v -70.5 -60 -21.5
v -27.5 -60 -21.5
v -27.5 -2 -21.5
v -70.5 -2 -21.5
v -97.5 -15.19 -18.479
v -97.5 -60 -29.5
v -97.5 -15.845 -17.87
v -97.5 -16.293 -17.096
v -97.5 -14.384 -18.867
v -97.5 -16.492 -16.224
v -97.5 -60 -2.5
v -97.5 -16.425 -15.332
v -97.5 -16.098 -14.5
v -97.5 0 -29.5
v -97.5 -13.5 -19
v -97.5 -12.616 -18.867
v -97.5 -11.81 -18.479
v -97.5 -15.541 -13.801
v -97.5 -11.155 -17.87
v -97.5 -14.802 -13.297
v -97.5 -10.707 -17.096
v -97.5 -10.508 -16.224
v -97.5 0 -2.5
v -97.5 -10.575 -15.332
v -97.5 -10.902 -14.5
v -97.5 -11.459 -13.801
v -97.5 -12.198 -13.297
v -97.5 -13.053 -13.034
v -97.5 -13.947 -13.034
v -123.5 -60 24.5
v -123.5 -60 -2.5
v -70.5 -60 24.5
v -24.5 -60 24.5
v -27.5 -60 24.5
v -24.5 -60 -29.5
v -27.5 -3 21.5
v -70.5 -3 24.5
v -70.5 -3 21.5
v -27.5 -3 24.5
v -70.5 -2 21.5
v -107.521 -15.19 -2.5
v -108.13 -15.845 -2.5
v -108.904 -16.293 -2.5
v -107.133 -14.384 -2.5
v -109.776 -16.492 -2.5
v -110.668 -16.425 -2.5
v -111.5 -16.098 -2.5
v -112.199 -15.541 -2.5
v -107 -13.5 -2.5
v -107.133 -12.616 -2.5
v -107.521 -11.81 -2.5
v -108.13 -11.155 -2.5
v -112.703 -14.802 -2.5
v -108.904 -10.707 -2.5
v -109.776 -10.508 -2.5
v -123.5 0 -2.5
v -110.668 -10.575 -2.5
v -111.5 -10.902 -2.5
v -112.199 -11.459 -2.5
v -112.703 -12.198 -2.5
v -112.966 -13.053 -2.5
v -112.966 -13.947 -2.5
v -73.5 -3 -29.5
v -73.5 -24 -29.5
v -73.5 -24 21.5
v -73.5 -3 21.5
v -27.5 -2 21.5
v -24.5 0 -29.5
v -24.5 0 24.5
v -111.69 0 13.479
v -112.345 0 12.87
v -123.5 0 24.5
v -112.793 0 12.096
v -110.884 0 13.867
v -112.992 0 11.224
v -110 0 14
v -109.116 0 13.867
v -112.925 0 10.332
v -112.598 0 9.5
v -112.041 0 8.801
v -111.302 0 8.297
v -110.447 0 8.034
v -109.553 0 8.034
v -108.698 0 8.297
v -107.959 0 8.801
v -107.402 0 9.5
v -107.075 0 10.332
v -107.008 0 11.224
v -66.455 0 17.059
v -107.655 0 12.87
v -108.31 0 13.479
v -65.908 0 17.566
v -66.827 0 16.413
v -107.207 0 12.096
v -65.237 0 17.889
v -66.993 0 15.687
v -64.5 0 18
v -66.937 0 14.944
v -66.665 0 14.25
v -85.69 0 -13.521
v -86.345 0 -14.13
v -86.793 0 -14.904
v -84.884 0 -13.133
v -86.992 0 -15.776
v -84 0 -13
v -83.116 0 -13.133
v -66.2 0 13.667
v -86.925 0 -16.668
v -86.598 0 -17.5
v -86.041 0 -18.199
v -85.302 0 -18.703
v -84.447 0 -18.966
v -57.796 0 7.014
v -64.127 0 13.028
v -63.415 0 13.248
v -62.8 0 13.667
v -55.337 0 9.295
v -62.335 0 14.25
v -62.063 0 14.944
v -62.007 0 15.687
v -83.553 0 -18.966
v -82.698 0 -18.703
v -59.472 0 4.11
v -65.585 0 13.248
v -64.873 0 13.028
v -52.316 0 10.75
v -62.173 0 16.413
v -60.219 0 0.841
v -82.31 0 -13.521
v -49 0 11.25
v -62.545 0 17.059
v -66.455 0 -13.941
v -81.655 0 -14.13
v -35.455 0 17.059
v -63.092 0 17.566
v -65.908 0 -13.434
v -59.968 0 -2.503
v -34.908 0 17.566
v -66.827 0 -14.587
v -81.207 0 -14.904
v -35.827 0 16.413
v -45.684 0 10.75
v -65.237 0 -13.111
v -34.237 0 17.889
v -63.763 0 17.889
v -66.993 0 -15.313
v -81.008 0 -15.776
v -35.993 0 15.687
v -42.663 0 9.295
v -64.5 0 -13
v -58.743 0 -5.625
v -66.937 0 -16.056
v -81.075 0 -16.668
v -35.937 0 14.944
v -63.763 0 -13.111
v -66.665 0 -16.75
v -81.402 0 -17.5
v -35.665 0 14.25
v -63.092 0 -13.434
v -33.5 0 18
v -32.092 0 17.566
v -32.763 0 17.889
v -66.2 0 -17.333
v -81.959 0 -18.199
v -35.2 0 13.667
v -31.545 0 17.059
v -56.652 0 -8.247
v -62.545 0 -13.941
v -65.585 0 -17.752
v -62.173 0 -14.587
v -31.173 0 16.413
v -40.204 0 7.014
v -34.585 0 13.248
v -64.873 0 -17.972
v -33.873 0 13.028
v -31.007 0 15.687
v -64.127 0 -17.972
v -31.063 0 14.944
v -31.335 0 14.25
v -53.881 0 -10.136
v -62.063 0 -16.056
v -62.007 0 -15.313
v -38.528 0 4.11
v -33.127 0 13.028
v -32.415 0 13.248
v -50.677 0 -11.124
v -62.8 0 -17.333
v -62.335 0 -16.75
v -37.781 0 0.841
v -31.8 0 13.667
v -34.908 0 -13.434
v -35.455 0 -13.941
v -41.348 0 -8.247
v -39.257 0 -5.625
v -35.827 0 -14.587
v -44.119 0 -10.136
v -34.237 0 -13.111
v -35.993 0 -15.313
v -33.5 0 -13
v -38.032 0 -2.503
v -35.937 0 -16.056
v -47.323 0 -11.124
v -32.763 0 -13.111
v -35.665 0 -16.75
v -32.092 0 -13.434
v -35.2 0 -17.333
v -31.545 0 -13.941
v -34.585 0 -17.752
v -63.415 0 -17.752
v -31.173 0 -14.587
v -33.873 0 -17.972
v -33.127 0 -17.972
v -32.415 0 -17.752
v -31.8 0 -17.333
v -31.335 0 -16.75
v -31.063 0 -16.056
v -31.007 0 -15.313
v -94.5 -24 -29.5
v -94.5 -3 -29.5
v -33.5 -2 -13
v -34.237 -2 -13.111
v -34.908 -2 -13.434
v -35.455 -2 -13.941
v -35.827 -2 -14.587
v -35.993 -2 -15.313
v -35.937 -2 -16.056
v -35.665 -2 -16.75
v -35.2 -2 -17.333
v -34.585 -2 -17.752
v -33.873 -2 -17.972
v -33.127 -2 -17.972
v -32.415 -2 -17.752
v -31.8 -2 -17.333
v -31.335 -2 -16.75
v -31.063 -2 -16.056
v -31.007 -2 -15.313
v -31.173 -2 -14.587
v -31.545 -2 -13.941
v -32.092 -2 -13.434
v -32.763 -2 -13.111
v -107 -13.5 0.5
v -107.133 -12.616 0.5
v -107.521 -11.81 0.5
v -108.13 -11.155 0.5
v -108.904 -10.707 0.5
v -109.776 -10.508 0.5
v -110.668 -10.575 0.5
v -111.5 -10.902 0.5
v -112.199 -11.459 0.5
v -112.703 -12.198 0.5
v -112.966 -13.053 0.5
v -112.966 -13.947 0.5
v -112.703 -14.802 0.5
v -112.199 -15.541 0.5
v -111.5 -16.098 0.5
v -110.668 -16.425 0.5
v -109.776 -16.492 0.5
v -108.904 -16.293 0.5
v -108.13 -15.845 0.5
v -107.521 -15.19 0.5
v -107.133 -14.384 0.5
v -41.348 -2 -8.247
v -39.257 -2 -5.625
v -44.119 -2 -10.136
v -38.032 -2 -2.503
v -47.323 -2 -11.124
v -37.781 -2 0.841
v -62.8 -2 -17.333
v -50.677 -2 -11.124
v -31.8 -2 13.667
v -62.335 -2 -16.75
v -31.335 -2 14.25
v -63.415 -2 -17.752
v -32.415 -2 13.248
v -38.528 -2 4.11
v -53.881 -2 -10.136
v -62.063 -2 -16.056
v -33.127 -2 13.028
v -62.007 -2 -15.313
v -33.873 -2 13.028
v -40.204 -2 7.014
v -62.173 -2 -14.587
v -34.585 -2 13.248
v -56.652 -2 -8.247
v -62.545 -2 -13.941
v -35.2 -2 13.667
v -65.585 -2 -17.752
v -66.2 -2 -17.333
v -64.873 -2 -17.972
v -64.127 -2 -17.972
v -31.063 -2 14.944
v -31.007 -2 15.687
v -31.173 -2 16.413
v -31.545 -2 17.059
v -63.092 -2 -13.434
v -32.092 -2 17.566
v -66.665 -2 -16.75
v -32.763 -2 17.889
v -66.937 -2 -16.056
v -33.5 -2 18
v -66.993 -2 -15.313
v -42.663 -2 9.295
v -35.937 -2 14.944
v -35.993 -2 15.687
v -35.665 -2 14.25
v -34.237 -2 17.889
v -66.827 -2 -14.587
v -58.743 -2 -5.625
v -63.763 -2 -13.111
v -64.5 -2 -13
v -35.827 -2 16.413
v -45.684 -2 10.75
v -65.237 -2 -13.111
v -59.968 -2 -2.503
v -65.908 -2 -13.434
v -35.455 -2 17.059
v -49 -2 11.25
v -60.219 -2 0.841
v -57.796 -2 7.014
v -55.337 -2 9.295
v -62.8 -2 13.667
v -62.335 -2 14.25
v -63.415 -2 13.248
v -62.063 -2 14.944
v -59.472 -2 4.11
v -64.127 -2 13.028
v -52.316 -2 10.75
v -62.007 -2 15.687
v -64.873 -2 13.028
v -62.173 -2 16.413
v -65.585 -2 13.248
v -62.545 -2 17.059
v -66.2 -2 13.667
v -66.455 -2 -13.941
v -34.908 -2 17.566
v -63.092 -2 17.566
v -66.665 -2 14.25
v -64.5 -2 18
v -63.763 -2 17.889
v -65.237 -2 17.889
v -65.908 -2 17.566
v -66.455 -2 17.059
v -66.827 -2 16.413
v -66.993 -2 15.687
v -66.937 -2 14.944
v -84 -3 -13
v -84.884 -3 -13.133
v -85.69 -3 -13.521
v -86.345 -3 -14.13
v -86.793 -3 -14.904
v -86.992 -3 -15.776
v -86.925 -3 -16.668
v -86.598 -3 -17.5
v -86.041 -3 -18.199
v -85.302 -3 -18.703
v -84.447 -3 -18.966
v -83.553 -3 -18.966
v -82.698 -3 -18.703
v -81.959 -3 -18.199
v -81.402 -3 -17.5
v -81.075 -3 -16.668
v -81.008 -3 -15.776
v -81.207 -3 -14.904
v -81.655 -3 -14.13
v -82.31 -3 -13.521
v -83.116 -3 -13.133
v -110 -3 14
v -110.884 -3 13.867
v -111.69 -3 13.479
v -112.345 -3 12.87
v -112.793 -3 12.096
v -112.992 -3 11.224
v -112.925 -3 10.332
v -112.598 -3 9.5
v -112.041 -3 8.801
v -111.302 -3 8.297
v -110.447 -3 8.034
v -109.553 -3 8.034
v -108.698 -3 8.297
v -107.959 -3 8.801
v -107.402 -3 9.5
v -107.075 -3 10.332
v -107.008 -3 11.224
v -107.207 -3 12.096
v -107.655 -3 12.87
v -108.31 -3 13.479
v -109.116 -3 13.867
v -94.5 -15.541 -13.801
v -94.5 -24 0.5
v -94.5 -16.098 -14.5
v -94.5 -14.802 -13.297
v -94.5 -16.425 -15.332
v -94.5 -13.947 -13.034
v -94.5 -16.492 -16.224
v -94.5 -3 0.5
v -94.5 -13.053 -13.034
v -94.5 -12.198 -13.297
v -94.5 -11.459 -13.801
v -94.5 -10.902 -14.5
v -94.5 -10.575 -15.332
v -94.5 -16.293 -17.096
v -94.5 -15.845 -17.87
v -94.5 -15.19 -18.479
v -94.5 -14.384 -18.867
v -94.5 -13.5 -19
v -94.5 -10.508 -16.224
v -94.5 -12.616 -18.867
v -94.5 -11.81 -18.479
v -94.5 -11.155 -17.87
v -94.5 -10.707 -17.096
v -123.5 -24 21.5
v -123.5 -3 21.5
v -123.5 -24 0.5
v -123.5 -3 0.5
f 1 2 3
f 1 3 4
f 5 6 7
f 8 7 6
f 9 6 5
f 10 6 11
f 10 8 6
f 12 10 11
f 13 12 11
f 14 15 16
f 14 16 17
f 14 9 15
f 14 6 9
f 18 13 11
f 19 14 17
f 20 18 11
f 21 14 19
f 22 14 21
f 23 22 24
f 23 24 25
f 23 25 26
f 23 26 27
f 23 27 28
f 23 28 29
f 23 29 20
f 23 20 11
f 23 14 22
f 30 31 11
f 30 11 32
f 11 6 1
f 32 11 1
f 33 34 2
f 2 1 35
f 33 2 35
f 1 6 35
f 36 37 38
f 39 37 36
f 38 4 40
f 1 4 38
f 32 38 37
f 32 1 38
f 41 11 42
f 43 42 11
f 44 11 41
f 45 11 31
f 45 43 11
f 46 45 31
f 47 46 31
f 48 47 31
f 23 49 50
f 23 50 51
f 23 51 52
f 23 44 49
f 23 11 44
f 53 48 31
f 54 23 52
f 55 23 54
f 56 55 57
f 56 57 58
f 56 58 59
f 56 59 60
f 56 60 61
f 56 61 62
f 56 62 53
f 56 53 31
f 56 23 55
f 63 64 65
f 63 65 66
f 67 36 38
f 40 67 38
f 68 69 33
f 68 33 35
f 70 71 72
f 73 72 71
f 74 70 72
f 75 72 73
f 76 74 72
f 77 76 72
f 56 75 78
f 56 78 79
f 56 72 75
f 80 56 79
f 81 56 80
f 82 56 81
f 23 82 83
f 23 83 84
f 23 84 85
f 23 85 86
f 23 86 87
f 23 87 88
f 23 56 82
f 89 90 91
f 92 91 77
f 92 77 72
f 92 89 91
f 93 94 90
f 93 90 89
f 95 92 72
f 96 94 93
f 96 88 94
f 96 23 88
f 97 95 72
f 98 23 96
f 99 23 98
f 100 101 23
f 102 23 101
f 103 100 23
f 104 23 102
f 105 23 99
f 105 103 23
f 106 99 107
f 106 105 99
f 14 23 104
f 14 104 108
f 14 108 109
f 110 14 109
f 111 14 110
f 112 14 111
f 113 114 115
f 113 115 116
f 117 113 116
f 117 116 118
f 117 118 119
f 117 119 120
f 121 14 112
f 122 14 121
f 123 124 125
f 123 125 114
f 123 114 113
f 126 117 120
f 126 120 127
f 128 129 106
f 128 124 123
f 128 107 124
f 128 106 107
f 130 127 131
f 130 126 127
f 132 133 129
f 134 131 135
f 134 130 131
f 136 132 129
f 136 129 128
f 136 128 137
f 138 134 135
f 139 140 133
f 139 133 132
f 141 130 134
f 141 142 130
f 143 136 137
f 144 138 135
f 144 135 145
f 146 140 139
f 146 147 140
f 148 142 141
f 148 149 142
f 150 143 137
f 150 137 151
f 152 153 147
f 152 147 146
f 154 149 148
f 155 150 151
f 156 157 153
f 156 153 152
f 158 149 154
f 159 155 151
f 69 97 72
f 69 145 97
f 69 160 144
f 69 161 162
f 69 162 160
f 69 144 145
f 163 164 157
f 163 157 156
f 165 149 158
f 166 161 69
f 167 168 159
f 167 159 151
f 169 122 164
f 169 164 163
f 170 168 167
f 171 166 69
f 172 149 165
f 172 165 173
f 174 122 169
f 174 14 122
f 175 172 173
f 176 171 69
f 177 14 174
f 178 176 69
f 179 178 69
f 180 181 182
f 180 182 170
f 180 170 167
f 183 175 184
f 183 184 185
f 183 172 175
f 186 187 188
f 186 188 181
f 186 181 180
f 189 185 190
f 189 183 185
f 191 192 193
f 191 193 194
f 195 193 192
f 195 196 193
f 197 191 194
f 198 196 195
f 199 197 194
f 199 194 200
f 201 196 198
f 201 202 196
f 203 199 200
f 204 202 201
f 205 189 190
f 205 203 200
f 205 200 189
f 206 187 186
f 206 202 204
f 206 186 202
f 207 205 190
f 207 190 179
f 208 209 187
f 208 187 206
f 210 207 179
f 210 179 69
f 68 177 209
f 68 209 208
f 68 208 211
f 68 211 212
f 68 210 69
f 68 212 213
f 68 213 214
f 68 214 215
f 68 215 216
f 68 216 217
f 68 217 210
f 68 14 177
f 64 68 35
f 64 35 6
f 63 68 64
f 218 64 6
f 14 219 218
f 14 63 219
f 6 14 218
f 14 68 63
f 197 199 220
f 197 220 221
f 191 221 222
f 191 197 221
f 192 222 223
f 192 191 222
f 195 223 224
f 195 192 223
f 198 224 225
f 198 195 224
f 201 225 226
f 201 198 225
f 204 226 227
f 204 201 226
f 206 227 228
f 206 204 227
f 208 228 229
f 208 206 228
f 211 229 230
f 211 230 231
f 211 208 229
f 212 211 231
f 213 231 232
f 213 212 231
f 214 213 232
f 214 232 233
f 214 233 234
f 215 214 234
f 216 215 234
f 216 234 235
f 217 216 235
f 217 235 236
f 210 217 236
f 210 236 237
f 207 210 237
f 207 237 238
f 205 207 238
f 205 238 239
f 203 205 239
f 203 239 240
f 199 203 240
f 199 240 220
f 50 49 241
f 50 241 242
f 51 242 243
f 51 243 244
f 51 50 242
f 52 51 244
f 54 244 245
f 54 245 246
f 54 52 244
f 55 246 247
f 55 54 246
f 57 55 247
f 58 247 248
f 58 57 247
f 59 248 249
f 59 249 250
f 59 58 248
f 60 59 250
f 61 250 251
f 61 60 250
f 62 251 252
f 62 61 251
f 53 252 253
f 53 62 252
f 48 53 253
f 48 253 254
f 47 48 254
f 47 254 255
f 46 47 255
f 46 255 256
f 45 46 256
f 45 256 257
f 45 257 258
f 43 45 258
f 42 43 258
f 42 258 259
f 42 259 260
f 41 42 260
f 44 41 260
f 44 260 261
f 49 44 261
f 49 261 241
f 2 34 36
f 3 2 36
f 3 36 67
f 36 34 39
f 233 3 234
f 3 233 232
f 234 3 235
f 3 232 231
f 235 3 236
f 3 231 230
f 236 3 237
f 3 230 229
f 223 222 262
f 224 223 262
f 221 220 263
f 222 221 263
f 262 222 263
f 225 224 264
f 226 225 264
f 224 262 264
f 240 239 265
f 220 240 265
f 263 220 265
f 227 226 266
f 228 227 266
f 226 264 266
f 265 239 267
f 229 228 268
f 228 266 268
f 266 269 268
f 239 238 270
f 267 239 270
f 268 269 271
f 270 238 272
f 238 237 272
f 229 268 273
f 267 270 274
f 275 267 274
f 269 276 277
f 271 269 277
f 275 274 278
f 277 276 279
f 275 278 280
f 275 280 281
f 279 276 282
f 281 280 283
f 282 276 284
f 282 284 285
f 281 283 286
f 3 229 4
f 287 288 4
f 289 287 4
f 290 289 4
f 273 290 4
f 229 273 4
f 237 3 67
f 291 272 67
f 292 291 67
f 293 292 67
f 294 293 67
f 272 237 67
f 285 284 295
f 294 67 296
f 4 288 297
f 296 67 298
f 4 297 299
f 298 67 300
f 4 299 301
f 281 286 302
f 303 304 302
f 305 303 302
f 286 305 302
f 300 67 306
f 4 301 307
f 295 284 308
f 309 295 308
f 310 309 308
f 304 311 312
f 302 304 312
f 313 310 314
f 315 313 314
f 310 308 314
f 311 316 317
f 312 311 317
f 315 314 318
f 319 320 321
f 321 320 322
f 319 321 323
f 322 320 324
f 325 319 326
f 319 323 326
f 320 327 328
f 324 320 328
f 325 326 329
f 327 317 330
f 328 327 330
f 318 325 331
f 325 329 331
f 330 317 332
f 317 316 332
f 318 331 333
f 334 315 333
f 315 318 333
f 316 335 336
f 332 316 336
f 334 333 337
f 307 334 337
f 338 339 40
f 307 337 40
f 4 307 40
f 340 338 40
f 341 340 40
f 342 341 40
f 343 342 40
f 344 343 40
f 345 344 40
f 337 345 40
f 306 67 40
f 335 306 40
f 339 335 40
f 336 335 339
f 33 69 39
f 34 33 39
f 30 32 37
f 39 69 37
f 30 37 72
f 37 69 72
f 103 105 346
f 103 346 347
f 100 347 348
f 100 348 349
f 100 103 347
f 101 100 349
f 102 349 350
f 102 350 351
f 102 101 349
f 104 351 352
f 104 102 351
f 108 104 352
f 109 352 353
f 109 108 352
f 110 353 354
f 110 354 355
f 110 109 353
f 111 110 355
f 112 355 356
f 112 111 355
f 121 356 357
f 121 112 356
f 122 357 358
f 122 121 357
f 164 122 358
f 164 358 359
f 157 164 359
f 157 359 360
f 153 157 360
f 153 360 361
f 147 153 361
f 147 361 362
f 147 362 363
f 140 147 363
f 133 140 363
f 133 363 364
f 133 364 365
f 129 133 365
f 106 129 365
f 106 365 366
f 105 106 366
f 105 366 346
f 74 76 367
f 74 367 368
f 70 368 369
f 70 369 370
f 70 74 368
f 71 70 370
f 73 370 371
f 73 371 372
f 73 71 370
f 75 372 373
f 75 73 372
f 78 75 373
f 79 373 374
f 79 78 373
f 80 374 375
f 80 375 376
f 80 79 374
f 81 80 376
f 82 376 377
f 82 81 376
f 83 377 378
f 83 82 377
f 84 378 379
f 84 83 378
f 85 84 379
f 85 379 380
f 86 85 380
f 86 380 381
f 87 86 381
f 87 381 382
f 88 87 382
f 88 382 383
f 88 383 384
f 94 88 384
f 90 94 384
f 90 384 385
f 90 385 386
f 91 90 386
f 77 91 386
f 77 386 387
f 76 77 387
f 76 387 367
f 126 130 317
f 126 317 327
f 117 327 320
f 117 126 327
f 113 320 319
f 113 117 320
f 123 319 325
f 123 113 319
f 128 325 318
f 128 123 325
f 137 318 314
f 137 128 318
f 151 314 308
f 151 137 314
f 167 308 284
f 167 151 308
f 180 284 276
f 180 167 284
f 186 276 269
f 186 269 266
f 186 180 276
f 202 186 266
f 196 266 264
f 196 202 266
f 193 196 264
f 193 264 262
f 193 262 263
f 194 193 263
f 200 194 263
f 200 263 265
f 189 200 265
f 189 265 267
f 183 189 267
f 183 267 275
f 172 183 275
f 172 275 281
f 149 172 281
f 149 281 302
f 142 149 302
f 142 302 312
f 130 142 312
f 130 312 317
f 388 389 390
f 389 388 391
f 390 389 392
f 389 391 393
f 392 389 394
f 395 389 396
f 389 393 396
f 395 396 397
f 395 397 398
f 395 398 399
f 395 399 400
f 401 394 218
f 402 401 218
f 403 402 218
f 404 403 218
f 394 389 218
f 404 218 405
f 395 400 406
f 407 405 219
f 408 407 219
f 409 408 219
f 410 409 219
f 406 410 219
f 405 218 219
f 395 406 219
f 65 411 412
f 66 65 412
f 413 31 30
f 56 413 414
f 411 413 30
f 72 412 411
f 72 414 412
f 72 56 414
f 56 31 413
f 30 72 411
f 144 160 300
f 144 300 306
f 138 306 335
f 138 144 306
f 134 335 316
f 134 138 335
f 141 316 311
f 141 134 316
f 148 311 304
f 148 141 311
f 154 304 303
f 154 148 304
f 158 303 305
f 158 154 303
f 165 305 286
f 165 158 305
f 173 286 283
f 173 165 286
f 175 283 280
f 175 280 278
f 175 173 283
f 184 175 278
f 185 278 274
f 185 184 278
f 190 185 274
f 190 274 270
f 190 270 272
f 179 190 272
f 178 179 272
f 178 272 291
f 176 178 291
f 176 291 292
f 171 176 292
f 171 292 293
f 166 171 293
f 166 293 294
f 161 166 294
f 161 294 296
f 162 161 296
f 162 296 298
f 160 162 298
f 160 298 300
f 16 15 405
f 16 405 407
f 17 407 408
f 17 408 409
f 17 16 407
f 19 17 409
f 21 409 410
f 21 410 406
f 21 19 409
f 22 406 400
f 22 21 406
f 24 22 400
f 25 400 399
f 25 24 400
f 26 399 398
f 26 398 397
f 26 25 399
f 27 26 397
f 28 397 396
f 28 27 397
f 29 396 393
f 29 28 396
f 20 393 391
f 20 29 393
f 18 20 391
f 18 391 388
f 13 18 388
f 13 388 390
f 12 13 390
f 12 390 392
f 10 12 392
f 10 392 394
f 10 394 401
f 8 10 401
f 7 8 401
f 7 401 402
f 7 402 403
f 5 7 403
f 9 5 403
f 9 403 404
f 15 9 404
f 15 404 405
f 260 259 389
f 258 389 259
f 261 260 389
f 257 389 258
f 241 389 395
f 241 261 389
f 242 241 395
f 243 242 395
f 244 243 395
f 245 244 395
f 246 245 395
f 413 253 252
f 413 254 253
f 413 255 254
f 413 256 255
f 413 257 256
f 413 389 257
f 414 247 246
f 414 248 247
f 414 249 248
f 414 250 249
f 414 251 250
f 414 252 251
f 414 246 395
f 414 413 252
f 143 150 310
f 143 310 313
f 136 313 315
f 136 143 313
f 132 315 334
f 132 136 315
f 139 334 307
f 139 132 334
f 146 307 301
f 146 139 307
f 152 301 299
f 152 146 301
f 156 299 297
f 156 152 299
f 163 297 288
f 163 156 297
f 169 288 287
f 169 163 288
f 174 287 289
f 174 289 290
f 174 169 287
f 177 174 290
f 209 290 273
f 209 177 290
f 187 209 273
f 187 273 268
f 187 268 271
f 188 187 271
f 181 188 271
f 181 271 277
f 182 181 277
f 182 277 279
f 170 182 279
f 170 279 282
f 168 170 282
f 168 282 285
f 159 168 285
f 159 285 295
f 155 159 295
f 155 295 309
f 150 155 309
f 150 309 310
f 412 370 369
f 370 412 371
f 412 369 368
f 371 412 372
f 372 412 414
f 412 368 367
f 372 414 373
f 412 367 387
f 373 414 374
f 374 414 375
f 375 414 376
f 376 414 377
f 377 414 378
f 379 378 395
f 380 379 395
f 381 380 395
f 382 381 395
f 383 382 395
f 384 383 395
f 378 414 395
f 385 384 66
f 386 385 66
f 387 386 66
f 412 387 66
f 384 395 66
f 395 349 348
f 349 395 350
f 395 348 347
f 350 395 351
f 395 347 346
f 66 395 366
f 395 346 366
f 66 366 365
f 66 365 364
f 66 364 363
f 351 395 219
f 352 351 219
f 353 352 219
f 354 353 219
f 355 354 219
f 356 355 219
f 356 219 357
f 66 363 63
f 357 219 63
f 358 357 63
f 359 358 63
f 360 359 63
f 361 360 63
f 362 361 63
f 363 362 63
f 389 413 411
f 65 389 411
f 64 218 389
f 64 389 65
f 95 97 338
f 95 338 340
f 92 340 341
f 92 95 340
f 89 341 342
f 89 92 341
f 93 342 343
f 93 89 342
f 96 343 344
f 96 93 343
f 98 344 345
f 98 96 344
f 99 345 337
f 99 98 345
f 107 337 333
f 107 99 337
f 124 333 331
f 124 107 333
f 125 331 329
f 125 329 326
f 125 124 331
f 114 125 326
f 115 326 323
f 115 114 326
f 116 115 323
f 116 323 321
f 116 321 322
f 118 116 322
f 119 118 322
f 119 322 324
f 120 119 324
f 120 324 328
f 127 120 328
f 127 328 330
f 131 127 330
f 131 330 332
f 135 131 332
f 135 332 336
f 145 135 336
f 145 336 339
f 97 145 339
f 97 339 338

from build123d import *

# Parameters (mm, degrees)
SKETCH1_R           = 2.5
SKETCH1_R_2         = 11.25
BOSS_EXTRUDE1_DEPTH = 60
SKETCH2_W           = 43
SKETCH2_H           = 43
CUT_EXTRUDE1_DEPTH  = 58
SKETCH3_W           = 21
SKETCH3_H           = 21
CUT_EXTRUDE2_DEPTH  = 51
SKETCH4_W           = 21
SKETCH4_H           = 21
CUT_EXTRUDE3_DEPTH  = 50
CUT_EXTRUDE5_REACH  = 100.991
SKETCH6_R           = 3
CUT_EXTRUDE6_REACH  = 102.102
SKETCH7_R           = 3
CUT_EXTRUDE7_REACH  = 101.394
SKETCH8_R           = 3
CUT_EXTRUDE8_REACH  = 102.102
SKETCH9_R           = 3
CUT_EXTRUDE9_REACH  = 149.541
SKETCH10_W          = 43
SKETCH10_H          = 57


with BuildPart() as part:
    # Sketch1 → Boss-Extrude1 (new body)
    with BuildSketch(Plane(origin=(0, 0, 0), x_dir=(1, 0, 0), z_dir=(0, 1, 0))):
        Polygon((-24.5, 29.5), (48.5, 29.5), (48.5, 2.5), (74.5, 2.5), (74.5, -24.5), (48.5, -24.5), (-24.5, -24.5), align=None)
        with Locations(Location((15.5, 15.5, 0), (0, 0, 270))):
            Circle(SKETCH1_R, mode=Mode.SUBTRACT)
        with Locations(Location((-15.5, 15.5, 0), (0, 0, 270))):
            Circle(SKETCH1_R, mode=Mode.SUBTRACT)
        with Locations(Location((15.5, -15.5, 0), (0, 0, 270))):
            Circle(SKETCH1_R, mode=Mode.SUBTRACT)
        with Locations(Location((-15.5, -15.5, 0), (0, 0, 270))):
            Circle(SKETCH1_R, mode=Mode.SUBTRACT)
        with Locations(Location((0, 0, 0), (0, 0, 270))):
            Circle(SKETCH1_R_2, mode=Mode.SUBTRACT)
    extrude(amount=-BOSS_EXTRUDE1_DEPTH)

    # Sketch2 → Cut-Extrude1 (cut)
    with BuildSketch(Plane.XZ.offset(60)):
        Rectangle(SKETCH2_W, SKETCH2_H)
    extrude(amount=-CUT_EXTRUDE1_DEPTH, mode=Mode.SUBTRACT)

    # Sketch3 → Cut-Extrude2 (cut)
    with BuildSketch(Plane(origin=(0, 0, -29.5), x_dir=(-1, 0, 0), z_dir=(0, 0, -1))):
        with Locations((-35, -13.5)):
            Rectangle(SKETCH3_W, SKETCH3_H)
    extrude(amount=-CUT_EXTRUDE2_DEPTH, mode=Mode.SUBTRACT)

    # Sketch4 → Cut-Extrude3 (cut)
    with BuildSketch(Plane(origin=(74.5, 0, 0), x_dir=(0, 0, -1), z_dir=(1, 0, 0))):
        with Locations((-11, -13.5)):
            Rectangle(SKETCH4_W, SKETCH4_H)
    extrude(amount=-CUT_EXTRUDE3_DEPTH, mode=Mode.SUBTRACT)

    # Sketch6 → Cut-Extrude5 (cut, up to next)
    with BuildSketch(Plane(origin=(48.5, 0, 0), x_dir=(0, 0, -1), z_dir=(1, 0, 0)), mode=Mode.PRIVATE) as cut_extrude5_sk1:
        with Locations((16, -13.5)):
            Circle(SKETCH6_R)
    cut_extrude5_tool1 = extrude(cut_extrude5_sk1.sketch, amount=-CUT_EXTRUDE5_REACH, mode=Mode.PRIVATE) & part.part
    add(cut_extrude5_tool1.solids().sort_by_distance((48.5, -13.5, -16))[0], mode=Mode.SUBTRACT)

    # Sketch7 → Cut-Extrude6 (cut, up to next)
    with BuildSketch(Plane(origin=(0, 0, 0), x_dir=(1, 0, 0), z_dir=(0, 1, 0)), mode=Mode.PRIVATE) as cut_extrude6_sk1:
        with Locations(Location((35, 16, 0), (0, 0, 270))):
            Circle(SKETCH7_R)
    cut_extrude6_tool1 = extrude(cut_extrude6_sk1.sketch, amount=-CUT_EXTRUDE6_REACH, mode=Mode.PRIVATE) & part.part
    add(cut_extrude6_tool1.solids().sort_by_distance((35, 0, -16))[0], mode=Mode.SUBTRACT)

    # Sketch8 → Cut-Extrude7 (cut, up to next)
    with BuildSketch(Plane(origin=(0, 0, -2.5), x_dir=(-1, 0, 0), z_dir=(0, 0, -1)), mode=Mode.PRIVATE) as cut_extrude7_sk1:
        with Locations((-61, -13.5)):
            Circle(SKETCH8_R)
    cut_extrude7_tool1 = extrude(cut_extrude7_sk1.sketch, amount=-CUT_EXTRUDE7_REACH, mode=Mode.PRIVATE) & part.part
    add(cut_extrude7_tool1.solids().sort_by_distance((61, -13.5, -2.5))[0], mode=Mode.SUBTRACT)

    # Sketch9 → Cut-Extrude8 (cut, up to next)
    with BuildSketch(Plane(origin=(0, 0, 0), x_dir=(1, 0, 0), z_dir=(0, 1, 0)), mode=Mode.PRIVATE) as cut_extrude8_sk1:
        with Locations(Location((61, -11, 0), (0, 0, 270))):
            Circle(SKETCH9_R)
    cut_extrude8_tool1 = extrude(cut_extrude8_sk1.sketch, amount=-CUT_EXTRUDE8_REACH, mode=Mode.PRIVATE) & part.part
    add(cut_extrude8_tool1.solids().sort_by_distance((61, 0, 11))[0], mode=Mode.SUBTRACT)


with BuildPart() as body_2:
    # Mirror3: mirrored copy
    add(part.part.mirror(Plane(origin=(-24.5, -60, 0), x_dir=(0, 0, 1), z_dir=(-1, 0, 0))))

    # Sketch10 → Cut-Extrude9 (cut, up to next)
    with BuildSketch(Plane.XY.offset(24.5), mode=Mode.PRIVATE) as cut_extrude9_sk1:
        with Locations((-49, -31.5)):
            Rectangle(SKETCH10_W, SKETCH10_H)
    cut_extrude9_tool1 = extrude(cut_extrude9_sk1.sketch, amount=-CUT_EXTRUDE9_REACH, mode=Mode.PRIVATE) & body_2.part
    add(cut_extrude9_tool1.solids().sort_by_distance((-49, -31.5, 24.5))[0], mode=Mode.SUBTRACT)


solid = body_2.part
